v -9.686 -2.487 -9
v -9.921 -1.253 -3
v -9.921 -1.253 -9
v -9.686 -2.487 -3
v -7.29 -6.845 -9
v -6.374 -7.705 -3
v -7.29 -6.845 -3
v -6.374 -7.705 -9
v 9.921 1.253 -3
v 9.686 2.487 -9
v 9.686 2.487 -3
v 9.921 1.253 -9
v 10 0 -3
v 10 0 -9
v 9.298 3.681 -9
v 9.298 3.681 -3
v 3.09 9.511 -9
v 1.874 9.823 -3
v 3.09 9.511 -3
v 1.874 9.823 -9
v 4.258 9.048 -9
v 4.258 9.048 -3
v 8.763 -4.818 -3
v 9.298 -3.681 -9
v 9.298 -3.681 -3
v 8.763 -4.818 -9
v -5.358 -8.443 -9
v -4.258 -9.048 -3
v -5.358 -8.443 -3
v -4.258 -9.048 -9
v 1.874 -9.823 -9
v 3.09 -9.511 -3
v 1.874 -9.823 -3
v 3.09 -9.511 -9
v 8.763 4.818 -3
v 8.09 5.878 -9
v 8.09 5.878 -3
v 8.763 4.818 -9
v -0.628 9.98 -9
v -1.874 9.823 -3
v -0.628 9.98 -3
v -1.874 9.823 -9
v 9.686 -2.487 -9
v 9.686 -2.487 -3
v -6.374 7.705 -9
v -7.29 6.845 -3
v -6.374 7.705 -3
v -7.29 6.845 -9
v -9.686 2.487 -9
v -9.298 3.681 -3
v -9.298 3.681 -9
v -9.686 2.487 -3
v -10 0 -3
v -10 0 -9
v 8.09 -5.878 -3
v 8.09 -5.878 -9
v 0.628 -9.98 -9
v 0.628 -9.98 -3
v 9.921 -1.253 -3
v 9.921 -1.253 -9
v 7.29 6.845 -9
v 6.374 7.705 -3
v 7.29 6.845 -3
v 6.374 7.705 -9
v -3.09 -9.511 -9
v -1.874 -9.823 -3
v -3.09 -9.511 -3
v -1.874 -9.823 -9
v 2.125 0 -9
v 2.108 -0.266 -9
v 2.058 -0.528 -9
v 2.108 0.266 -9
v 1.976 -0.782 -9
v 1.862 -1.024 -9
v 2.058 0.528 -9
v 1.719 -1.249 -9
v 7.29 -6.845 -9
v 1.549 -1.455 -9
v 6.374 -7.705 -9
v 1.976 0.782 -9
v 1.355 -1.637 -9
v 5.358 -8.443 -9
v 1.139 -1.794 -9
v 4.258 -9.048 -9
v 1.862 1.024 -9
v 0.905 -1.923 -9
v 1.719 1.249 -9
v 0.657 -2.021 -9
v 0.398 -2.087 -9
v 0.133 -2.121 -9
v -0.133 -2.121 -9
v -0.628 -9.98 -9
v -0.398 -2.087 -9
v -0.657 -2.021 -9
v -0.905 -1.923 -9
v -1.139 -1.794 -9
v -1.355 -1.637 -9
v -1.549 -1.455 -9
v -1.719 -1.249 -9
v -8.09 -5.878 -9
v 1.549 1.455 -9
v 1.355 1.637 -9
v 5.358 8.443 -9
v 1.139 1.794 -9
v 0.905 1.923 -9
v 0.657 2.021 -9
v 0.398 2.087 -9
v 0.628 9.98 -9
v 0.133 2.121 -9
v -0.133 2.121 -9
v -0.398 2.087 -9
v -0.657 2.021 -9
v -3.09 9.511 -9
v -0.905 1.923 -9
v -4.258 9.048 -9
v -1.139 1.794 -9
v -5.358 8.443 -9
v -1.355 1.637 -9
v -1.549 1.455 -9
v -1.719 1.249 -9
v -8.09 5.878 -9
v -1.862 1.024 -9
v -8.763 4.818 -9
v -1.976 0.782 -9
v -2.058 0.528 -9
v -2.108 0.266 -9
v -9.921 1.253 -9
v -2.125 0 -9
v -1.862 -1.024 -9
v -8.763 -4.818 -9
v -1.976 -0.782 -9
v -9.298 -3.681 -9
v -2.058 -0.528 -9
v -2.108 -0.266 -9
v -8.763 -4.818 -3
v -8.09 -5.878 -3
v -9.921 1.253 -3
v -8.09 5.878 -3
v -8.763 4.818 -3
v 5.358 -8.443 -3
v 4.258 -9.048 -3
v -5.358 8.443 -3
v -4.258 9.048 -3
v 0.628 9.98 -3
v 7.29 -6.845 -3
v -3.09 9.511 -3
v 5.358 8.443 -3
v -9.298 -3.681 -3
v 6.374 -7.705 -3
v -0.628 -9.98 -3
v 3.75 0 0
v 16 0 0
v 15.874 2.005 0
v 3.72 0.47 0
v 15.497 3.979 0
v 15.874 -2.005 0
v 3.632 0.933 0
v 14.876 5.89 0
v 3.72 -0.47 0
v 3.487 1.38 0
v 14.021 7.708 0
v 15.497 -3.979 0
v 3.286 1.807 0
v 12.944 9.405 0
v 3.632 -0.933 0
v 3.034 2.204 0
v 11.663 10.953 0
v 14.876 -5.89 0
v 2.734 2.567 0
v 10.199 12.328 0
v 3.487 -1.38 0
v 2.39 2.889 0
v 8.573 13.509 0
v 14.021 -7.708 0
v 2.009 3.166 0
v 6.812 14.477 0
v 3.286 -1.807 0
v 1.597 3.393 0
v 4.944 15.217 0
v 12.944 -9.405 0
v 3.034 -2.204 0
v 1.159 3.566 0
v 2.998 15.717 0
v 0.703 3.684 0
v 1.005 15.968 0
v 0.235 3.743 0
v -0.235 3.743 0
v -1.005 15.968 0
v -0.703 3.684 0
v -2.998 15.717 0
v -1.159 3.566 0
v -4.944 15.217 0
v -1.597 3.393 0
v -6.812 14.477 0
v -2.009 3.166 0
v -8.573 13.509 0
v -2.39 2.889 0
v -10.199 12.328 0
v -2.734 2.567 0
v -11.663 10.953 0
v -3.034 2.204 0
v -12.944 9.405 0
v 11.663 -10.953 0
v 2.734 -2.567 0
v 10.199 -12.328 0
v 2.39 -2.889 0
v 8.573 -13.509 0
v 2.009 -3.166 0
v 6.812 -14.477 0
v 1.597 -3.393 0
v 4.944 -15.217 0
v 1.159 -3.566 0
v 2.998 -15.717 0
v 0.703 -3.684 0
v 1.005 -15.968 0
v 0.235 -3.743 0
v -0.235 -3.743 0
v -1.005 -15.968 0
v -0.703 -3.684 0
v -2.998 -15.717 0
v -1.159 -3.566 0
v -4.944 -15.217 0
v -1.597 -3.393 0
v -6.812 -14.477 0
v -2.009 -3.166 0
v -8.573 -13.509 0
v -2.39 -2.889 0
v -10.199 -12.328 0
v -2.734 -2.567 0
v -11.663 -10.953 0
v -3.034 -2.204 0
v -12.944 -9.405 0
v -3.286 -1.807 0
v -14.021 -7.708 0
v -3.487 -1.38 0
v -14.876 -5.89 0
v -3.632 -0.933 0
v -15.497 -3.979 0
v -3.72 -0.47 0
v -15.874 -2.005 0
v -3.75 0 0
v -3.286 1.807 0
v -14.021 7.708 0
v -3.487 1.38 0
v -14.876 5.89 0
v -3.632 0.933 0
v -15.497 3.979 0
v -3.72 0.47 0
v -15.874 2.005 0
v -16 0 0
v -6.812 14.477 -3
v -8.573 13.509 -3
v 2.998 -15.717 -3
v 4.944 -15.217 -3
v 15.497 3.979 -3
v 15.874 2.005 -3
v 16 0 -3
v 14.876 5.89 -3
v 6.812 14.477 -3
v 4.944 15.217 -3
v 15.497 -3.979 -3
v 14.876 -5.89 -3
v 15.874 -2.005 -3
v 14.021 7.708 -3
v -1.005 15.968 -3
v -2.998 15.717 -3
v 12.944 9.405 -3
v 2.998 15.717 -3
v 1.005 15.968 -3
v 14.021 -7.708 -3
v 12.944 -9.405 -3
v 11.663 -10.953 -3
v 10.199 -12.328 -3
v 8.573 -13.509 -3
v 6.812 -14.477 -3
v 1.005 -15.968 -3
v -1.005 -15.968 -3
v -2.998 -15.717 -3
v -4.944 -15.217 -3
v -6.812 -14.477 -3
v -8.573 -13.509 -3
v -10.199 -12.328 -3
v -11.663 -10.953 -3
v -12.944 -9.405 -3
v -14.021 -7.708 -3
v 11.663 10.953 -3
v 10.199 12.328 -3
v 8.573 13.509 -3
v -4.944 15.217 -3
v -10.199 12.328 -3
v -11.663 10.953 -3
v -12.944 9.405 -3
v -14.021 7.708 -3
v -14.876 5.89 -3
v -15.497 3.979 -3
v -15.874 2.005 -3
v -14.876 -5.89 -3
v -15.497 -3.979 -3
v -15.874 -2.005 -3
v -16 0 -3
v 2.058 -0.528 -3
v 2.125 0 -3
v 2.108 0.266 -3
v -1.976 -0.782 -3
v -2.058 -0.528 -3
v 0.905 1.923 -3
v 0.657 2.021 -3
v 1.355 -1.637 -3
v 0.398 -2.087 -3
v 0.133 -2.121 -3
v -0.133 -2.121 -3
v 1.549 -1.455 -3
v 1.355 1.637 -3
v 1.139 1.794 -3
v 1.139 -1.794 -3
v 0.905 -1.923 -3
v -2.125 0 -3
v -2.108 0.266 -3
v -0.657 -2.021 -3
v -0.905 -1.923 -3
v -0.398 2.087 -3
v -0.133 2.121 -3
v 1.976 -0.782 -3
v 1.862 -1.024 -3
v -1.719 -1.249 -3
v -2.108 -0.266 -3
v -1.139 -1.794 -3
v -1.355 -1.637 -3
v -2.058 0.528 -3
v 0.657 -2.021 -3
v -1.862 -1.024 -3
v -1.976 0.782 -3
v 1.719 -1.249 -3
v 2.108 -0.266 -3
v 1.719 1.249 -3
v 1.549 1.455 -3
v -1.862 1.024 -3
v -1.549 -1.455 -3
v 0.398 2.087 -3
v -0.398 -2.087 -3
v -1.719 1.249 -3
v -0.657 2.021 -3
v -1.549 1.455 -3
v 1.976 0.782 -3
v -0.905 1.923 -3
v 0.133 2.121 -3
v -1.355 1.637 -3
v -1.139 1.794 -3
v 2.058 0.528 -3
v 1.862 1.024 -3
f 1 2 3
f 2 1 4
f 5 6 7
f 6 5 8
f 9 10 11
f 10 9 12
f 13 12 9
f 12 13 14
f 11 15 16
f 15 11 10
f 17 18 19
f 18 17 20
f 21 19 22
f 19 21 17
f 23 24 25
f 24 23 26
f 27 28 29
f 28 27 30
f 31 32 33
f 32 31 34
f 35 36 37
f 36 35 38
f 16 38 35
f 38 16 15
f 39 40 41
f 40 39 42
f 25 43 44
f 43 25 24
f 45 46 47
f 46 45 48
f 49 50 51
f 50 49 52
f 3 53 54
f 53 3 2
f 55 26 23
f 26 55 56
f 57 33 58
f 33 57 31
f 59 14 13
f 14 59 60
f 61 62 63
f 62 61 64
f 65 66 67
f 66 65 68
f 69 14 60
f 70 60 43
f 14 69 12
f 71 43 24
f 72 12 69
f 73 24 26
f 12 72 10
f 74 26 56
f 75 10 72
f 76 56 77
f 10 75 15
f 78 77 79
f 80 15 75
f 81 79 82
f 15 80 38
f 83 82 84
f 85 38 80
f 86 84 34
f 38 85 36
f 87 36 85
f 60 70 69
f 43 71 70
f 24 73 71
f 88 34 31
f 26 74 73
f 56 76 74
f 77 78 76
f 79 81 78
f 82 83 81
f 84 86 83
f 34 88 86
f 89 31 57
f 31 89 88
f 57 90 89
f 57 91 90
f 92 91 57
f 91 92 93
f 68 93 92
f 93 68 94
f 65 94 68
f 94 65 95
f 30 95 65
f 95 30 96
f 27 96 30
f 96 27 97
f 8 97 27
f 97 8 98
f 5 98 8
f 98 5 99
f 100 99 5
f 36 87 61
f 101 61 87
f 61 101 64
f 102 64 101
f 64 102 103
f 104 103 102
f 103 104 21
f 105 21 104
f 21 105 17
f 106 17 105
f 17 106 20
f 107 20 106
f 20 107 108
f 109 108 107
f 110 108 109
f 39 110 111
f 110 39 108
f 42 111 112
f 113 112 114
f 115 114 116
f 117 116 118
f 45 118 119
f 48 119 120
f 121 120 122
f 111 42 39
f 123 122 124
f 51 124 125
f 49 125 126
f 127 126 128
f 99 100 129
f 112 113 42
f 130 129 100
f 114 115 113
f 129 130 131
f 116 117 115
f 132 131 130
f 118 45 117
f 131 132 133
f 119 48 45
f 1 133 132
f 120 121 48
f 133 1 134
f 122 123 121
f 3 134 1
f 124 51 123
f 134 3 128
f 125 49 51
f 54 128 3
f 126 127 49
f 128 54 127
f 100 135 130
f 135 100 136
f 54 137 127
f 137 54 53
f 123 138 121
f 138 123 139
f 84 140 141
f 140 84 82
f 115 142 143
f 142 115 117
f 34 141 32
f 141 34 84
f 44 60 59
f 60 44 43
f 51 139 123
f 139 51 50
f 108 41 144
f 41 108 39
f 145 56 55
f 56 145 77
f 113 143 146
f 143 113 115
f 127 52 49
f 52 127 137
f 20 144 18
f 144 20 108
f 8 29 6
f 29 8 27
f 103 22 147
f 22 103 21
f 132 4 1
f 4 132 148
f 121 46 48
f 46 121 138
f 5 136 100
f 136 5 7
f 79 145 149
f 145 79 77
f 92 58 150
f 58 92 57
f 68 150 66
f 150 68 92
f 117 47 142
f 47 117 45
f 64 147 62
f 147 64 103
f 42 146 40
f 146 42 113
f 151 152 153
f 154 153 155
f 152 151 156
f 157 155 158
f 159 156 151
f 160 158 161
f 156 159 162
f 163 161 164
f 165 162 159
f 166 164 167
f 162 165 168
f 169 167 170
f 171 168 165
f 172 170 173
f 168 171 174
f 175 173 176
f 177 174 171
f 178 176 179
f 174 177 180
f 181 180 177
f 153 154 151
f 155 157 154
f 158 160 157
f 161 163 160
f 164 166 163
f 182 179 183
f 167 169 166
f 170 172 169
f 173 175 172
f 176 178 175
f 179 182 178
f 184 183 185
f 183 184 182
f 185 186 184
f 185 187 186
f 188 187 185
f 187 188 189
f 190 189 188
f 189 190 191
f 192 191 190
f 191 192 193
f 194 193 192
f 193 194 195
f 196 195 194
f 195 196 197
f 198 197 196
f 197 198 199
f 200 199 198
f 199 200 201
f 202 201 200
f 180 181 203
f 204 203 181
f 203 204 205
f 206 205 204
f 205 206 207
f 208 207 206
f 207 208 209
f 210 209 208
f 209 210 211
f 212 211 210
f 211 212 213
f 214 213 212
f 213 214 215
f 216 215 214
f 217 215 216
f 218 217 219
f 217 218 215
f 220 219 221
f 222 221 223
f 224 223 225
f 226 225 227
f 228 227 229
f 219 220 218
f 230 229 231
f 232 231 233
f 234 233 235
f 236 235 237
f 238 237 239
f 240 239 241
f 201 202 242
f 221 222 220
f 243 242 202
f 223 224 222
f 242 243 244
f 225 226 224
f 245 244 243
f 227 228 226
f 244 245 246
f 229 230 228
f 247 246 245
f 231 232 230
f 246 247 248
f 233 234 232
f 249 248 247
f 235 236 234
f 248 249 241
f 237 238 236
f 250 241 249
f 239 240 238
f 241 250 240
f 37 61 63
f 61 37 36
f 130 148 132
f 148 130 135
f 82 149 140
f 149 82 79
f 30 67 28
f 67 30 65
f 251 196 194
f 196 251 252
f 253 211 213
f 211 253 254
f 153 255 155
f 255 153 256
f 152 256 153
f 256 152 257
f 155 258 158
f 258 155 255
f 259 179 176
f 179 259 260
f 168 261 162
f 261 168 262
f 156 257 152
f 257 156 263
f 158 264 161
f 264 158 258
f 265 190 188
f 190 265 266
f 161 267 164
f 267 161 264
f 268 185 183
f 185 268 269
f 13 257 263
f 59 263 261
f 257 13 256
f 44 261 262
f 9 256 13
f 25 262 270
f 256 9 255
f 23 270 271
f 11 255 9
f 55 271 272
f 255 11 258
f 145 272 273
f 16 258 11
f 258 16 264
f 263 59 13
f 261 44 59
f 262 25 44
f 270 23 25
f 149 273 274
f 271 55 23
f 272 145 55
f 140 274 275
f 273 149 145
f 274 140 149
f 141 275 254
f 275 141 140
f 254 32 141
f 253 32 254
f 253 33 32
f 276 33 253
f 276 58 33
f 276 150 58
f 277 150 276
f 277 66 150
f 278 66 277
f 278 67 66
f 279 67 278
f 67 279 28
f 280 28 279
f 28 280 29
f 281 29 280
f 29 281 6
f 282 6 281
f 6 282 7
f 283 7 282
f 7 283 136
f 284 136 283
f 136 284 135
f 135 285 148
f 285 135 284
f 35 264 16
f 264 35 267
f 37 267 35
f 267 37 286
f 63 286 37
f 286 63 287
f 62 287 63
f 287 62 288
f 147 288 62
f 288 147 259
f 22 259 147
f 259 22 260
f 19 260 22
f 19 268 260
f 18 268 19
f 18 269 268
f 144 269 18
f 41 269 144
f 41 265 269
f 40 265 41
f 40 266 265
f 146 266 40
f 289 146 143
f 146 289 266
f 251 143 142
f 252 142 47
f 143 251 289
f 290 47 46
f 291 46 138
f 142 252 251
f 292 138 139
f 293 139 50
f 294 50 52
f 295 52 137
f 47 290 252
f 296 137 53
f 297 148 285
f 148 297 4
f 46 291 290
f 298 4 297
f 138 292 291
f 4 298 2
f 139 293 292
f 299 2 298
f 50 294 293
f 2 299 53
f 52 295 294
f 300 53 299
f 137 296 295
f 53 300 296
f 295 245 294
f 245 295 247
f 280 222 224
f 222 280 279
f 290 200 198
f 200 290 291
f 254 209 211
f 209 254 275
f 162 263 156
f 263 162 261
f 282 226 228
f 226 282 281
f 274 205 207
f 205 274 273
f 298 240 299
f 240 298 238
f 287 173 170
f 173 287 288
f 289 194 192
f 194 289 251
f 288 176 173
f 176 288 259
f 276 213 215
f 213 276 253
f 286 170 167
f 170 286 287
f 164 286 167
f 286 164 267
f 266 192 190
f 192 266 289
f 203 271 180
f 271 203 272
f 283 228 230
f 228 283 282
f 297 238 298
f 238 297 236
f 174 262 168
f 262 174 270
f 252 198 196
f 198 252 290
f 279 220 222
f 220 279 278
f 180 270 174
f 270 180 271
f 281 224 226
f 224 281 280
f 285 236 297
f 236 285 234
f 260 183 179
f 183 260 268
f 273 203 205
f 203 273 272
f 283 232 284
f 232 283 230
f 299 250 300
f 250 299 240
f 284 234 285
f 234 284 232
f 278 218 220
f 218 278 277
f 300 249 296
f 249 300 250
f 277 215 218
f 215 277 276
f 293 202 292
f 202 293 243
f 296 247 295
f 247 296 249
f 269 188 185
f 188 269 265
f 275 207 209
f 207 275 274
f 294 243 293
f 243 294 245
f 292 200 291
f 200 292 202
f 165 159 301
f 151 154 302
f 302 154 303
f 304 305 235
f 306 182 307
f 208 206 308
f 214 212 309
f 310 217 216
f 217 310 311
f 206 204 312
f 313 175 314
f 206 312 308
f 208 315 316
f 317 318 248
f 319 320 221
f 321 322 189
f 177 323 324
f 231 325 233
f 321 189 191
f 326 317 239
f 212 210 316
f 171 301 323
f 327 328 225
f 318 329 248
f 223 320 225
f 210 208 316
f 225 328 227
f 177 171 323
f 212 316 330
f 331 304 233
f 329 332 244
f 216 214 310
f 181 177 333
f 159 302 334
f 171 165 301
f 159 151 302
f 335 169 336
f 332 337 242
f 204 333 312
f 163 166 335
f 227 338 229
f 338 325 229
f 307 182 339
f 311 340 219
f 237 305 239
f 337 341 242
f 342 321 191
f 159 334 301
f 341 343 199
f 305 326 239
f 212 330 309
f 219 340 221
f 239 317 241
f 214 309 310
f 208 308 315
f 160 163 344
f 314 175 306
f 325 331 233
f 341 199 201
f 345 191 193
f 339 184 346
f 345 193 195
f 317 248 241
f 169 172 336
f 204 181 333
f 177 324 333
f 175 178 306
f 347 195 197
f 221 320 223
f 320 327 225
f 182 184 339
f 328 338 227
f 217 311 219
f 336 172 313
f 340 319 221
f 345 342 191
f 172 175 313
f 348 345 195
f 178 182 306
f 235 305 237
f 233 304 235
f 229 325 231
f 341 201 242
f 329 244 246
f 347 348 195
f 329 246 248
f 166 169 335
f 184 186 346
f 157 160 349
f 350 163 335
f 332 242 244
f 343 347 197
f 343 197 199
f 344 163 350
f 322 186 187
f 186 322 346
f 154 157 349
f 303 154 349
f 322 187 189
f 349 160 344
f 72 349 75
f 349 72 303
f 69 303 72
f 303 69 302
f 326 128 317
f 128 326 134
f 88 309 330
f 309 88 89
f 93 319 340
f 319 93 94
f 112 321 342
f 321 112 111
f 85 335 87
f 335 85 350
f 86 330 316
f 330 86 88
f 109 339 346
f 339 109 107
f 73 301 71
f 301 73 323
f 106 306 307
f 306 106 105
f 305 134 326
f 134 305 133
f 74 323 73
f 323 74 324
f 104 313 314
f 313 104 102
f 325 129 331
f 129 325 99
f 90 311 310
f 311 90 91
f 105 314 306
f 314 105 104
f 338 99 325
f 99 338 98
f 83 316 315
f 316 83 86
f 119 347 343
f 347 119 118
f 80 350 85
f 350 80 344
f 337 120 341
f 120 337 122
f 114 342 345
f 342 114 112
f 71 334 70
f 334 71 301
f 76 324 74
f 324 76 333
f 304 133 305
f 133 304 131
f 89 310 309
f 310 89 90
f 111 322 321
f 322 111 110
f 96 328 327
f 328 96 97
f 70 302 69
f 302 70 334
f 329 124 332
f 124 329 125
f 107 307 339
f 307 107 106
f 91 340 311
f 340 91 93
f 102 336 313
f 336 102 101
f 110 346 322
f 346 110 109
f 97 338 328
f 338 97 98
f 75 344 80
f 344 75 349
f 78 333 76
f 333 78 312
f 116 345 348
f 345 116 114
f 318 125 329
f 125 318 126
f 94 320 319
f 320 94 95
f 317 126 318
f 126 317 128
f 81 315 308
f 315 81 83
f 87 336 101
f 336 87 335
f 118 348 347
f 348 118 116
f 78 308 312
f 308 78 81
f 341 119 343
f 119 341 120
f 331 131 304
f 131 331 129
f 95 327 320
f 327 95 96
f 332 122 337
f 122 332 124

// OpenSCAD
$fn = 50;


difference() {
	union() {
		translate(v = [0, 0, -9.0000000000]) {
			cylinder(h = 9, r = 10.0000000000);
		}
		translate(v = [0, 0, -3.0000000000]) {
			cylinder(h = 3, r = 16.0000000000);
		}
	}
	union() {
		translate(v = [0, 0, 0]) {
			rotate(a = [0, 0, 0]) {
				difference() {
					union() {
						#translate(v = [0, 0, -9.0000000000]) {
							cylinder(h = 9, r = 2.0000000000);
						}
						#translate(v = [0, 0, -3]) {
							cylinder(h = 3, r1 = 2.1250000000, r2 = 3.7500000000);
						}
						#translate(v = [0, 0, -9.0000000000]) {
							cylinder(h = 9, r = 2.1250000000);
						}
						#translate(v = [0, 0, -9.0000000000]) {
							cylinder(h = 9, r = 2.0000000000);
						}
					}
					union();
				}
			}
		}
	}
}
